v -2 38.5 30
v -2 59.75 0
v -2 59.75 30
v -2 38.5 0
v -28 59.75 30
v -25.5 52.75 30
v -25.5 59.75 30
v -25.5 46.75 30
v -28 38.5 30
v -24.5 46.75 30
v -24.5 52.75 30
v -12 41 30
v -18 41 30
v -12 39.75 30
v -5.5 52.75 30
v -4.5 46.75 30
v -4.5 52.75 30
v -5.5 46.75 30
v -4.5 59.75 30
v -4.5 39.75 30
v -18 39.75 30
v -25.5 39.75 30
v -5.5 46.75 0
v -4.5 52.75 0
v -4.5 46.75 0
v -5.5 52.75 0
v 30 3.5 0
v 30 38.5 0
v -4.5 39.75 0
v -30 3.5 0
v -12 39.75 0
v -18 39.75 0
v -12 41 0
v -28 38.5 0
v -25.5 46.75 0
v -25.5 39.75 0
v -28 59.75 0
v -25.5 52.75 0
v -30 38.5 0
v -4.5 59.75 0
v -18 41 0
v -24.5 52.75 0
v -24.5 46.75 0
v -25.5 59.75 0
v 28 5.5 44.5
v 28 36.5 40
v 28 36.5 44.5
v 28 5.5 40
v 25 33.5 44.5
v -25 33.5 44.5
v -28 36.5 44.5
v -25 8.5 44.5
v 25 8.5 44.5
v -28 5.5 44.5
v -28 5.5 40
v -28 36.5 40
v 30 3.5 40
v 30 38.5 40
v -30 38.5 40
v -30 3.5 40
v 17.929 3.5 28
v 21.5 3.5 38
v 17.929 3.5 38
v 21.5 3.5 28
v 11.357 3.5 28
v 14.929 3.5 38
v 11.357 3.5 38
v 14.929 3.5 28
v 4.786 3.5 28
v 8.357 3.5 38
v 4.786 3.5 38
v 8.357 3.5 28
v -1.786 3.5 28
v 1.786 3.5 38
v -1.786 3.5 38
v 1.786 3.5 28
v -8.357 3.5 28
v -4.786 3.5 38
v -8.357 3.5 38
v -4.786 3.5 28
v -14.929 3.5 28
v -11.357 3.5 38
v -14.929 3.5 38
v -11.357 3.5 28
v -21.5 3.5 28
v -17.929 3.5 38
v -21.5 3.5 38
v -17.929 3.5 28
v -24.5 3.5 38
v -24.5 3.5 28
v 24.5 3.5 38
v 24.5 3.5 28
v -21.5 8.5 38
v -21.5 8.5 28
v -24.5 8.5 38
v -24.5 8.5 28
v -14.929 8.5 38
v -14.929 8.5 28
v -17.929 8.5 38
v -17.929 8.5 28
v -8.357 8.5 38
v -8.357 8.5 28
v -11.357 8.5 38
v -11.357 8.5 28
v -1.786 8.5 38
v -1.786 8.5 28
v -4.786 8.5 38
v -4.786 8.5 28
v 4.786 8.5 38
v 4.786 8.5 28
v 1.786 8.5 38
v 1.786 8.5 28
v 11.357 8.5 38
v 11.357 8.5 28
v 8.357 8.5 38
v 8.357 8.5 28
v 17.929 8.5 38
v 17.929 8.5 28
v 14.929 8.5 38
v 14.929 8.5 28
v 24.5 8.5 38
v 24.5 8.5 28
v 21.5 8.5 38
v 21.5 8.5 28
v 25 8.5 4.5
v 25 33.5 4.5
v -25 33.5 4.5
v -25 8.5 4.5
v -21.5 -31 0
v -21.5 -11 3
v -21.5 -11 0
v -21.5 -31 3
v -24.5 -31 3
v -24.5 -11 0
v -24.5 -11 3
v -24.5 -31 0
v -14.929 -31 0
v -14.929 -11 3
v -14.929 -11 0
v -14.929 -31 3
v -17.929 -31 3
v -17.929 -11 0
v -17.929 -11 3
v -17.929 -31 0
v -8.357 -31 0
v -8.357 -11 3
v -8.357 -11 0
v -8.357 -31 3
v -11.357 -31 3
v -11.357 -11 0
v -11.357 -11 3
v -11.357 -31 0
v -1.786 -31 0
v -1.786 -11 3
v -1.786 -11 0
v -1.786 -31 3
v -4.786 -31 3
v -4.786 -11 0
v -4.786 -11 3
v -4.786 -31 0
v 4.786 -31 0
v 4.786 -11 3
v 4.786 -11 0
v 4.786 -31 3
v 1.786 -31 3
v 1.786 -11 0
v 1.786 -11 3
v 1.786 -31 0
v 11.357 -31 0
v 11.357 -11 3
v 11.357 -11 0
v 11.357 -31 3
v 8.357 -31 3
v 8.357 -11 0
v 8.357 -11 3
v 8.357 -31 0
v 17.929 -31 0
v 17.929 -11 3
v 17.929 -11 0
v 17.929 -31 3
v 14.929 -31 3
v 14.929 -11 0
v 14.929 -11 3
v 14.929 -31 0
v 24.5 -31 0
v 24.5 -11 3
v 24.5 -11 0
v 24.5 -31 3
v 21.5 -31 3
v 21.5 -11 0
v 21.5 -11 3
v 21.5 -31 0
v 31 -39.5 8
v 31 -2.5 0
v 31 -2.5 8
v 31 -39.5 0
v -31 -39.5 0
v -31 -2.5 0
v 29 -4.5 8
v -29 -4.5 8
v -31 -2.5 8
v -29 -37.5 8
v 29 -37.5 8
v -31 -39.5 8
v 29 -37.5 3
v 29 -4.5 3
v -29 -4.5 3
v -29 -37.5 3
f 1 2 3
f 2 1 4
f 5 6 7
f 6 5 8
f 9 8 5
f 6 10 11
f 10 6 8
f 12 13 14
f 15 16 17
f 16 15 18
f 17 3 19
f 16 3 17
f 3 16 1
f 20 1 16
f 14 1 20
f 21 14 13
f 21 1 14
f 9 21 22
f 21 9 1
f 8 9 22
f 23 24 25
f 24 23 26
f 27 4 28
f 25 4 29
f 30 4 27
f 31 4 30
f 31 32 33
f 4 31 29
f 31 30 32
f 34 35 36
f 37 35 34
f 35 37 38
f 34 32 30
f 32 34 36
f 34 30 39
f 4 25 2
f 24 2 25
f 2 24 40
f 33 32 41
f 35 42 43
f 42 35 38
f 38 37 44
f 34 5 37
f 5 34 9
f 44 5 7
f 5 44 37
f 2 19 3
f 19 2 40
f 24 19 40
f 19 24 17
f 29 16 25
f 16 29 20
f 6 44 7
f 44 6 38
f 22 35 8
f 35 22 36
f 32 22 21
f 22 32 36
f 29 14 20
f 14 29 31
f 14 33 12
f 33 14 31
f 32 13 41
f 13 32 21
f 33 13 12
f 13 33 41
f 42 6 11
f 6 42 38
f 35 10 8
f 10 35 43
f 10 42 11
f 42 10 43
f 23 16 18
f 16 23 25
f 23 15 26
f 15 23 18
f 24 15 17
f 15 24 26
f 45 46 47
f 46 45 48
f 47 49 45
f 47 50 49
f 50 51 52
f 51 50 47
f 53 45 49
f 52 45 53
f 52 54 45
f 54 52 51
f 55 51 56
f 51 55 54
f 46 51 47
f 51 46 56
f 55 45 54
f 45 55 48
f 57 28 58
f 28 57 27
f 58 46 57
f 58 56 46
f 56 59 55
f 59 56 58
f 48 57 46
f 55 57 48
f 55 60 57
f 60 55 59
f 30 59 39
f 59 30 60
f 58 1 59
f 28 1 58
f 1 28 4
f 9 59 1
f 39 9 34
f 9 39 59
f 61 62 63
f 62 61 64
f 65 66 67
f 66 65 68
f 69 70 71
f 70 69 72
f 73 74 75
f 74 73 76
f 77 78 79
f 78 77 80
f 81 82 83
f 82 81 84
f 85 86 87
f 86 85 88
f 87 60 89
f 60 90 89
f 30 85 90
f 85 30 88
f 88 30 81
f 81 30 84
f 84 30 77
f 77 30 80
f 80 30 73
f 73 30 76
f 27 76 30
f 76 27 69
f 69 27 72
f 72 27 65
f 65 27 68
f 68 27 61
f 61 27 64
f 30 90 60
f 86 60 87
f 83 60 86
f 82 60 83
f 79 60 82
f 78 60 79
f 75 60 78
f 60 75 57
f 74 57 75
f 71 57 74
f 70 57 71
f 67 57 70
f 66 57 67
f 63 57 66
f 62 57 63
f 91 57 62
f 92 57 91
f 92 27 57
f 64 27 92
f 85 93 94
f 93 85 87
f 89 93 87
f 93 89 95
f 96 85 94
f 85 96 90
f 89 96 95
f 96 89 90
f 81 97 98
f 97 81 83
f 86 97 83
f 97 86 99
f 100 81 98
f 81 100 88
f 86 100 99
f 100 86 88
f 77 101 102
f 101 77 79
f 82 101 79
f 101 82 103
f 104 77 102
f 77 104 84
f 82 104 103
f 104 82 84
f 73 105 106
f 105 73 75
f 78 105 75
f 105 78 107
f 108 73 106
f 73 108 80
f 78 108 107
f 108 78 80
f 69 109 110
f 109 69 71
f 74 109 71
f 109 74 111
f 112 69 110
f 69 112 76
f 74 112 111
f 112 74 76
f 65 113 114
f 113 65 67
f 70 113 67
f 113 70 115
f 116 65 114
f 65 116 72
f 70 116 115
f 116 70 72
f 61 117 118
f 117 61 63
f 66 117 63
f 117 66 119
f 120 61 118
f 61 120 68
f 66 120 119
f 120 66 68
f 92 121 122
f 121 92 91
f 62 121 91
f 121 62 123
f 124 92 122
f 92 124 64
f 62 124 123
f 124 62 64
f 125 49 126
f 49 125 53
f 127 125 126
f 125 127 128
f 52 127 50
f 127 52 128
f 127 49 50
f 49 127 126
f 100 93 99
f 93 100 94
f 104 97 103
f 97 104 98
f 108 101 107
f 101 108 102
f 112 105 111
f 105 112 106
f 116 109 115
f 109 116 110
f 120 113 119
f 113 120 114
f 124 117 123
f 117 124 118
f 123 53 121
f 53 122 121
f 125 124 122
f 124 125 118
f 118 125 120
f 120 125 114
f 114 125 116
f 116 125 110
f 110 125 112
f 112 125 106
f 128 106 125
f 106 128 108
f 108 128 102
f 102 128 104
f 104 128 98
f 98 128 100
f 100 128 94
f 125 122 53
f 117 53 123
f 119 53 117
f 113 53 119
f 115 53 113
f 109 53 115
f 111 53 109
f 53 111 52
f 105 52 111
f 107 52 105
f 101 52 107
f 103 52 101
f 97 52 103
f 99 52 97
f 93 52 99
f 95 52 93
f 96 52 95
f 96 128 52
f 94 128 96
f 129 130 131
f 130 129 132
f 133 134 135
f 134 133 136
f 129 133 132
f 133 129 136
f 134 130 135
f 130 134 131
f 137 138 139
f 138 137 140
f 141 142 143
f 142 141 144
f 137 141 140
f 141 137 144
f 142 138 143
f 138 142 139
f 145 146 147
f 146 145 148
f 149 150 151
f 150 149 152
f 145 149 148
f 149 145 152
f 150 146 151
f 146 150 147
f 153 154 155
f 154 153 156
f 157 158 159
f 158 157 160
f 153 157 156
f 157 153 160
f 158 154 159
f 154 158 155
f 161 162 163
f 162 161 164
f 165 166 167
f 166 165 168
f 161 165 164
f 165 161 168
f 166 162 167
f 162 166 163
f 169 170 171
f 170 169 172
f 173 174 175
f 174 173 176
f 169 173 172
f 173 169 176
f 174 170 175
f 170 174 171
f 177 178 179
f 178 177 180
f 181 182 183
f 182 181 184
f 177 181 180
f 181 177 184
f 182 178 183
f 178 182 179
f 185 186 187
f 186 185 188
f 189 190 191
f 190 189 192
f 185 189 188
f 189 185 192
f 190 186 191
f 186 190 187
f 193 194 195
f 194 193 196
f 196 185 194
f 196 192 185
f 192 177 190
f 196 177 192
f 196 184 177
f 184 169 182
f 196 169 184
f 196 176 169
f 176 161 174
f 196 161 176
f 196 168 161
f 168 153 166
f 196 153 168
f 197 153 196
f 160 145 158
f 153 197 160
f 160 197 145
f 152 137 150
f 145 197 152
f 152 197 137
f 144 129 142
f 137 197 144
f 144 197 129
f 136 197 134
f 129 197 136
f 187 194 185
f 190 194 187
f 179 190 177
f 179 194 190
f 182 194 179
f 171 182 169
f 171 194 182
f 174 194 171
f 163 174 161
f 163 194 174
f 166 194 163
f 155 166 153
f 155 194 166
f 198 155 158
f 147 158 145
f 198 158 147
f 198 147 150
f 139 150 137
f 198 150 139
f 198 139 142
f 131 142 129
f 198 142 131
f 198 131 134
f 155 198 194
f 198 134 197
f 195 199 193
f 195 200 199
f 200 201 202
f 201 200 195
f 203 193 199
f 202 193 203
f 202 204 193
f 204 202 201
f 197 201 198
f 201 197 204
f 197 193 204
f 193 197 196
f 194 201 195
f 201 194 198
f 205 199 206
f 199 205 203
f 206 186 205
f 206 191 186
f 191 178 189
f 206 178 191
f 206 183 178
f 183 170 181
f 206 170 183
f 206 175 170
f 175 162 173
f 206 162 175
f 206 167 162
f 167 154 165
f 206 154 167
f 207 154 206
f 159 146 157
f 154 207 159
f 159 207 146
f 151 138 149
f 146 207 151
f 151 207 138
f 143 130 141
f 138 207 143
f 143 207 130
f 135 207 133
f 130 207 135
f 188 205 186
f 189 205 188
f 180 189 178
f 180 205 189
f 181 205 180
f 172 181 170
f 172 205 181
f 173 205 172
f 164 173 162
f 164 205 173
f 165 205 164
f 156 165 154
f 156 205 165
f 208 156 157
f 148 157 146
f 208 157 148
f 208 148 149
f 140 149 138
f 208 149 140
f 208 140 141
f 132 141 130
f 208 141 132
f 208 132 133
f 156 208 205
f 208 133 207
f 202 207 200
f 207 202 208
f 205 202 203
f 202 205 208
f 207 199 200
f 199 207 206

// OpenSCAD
translate([0,21,46/2]) basebox();
translate([0,-21,8/2]) boxlid();

module boxlid()
{
  rotate([180,0,0])
  {
    difference()
    {
      cube([50+6+4+2,25+6+4+2,8],center=true);
      translate([0,0,-3]) cube([50+6+2,25+6+2,8],center=true);
      for(c=[0:7])
        translate([-23+((46/7)*c),0,0])
          cube([3,20,20],center=true);
    }
  }
}

module basebox()
{
  difference()
  {
    union()
    {
      cube([50+6,25+6,40+3],center=true);
      translate([0,0,-3]) cube([50+6+4,25+6+4,40+3-3],center=true);
      translate([-15,27.5,-8]) clip();
    }
    translate([0,0,2.5]) cube([50,25,42],center=true);
    for(c=[0:7])
      translate([-23+((46/7)*c),-32.5/2,10])
        cube([3,10,10],center=true);
  }
}

module clip()
{
  union()
  {
    difference()
    {
      cube([26,22.5,30],center=true);
      translate([0,3.75,0]) cube([21,25,30+5],center=true);
    }
    translate([0,-8.5,0]) cube([6,2,30],center=true);
    translate([-10.5,1.25,0]) rotate([0,0,90]) cube([6,2,30],center=true);
    translate([10.5,1.25,0]) rotate([0,0,90]) cube([6,2,30],center=true);
  }
}
